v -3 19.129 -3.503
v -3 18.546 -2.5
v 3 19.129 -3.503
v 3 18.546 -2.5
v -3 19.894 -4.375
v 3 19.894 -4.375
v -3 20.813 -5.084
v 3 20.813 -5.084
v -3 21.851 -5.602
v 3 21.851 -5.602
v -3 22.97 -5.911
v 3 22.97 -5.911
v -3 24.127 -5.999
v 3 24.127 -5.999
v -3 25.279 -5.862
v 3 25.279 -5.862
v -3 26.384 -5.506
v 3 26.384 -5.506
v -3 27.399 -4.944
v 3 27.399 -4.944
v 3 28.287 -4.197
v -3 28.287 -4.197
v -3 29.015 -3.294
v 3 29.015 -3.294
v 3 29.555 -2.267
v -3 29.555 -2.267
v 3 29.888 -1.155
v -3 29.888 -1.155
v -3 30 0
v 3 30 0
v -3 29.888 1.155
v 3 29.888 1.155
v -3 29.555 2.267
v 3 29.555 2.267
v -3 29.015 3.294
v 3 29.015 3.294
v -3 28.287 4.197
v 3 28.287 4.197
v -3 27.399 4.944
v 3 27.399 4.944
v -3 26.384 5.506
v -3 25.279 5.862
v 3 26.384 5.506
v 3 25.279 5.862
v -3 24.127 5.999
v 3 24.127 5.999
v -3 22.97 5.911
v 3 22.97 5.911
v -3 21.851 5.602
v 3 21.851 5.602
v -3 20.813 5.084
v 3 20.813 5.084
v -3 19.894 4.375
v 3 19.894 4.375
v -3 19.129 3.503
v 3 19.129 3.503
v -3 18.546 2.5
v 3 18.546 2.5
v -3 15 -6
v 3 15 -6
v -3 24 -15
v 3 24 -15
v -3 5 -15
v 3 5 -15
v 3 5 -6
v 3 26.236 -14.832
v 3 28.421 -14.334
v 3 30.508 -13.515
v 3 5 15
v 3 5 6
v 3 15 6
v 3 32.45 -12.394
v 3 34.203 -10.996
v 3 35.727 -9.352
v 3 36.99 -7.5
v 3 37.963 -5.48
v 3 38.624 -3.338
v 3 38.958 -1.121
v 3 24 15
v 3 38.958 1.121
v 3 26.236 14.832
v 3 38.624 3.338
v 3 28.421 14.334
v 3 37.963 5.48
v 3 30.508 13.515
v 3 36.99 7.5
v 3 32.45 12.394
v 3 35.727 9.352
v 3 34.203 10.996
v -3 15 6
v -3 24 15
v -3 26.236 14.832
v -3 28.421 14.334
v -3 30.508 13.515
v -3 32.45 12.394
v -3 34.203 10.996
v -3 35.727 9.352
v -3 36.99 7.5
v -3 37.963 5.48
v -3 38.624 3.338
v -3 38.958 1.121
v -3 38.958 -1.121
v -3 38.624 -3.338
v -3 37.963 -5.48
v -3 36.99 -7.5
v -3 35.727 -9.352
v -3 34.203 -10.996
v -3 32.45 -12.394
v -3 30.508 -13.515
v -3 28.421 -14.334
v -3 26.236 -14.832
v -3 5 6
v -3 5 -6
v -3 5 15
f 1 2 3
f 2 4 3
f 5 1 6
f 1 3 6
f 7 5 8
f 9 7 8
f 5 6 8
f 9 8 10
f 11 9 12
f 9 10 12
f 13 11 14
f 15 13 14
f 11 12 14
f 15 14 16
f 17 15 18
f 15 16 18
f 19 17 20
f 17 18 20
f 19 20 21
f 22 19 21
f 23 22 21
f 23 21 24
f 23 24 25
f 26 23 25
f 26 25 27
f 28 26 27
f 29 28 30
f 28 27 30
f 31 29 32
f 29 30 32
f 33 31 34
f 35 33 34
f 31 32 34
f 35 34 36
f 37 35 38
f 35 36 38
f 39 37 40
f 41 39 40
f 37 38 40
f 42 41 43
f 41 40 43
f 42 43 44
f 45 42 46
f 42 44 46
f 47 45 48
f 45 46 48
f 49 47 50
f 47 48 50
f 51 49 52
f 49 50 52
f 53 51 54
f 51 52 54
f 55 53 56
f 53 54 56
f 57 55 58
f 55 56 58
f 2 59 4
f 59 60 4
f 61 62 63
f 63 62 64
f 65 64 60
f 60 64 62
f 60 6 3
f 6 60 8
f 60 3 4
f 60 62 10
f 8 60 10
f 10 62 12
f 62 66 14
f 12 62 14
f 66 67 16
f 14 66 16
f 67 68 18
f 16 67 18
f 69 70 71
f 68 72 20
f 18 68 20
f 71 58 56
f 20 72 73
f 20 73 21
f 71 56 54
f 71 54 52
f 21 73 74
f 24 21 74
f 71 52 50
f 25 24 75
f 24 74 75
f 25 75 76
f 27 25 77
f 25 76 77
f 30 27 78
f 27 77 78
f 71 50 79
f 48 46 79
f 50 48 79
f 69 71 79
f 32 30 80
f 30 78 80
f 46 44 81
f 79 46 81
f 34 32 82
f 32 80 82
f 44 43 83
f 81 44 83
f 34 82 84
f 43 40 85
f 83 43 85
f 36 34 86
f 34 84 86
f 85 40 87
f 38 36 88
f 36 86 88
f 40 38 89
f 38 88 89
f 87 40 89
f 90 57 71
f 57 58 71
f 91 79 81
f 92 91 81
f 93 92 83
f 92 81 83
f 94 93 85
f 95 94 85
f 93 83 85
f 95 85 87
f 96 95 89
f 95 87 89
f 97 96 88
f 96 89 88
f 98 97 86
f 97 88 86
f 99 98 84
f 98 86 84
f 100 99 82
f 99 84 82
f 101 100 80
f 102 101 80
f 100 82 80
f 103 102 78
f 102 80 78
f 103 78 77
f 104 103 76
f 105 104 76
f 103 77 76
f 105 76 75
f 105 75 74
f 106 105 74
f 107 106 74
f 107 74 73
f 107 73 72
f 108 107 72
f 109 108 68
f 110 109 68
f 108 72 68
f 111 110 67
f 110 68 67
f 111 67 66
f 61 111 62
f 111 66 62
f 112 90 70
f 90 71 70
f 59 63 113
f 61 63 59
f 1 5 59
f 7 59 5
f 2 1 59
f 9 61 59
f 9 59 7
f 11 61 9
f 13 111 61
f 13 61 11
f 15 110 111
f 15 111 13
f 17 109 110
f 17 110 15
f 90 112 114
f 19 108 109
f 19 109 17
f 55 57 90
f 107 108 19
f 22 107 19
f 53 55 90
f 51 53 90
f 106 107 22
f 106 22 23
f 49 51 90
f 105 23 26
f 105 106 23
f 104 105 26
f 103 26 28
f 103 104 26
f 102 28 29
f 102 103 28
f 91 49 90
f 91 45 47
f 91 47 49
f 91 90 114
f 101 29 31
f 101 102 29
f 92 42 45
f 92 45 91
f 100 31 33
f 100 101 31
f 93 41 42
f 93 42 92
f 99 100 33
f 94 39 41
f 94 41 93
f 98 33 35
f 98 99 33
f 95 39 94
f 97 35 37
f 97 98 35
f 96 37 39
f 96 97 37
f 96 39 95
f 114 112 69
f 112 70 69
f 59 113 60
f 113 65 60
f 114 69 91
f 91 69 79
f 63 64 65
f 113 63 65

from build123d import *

# Parameters (mm, degrees)
EXTRUDE_1_DEPTH = 3


with BuildPart() as part:
    # Эскиз2 → Бобышка-Вытянуть1 (new, symmetric)
    with BuildSketch(Plane(origin=(0, 0, 0), x_dir=(0, 0, -1), z_dir=(1, 0, 0))):
        with BuildLine():
            Line((15, 5), (6, 5))
            Line((6, 5), (6, 15))
            Line((6, 15), (2.5, 18.545643943))
            ThreePointArc((2.5, 18.545643943), (0, 30), (-2.5, 18.545643943))
            Line((-2.5, 18.545643943), (-6, 15))
            Line((-6, 15), (-6, 5))
            Line((-6, 5), (-15, 5))
            Line((-15, 5), (-15, 24))
            ThreePointArc((-15, 24), (0, 39), (15, 24))
            Line((15, 24), (15, 5))
        make_face()
    extrude(amount=EXTRUDE_1_DEPTH, both=True)


solid = part.part
